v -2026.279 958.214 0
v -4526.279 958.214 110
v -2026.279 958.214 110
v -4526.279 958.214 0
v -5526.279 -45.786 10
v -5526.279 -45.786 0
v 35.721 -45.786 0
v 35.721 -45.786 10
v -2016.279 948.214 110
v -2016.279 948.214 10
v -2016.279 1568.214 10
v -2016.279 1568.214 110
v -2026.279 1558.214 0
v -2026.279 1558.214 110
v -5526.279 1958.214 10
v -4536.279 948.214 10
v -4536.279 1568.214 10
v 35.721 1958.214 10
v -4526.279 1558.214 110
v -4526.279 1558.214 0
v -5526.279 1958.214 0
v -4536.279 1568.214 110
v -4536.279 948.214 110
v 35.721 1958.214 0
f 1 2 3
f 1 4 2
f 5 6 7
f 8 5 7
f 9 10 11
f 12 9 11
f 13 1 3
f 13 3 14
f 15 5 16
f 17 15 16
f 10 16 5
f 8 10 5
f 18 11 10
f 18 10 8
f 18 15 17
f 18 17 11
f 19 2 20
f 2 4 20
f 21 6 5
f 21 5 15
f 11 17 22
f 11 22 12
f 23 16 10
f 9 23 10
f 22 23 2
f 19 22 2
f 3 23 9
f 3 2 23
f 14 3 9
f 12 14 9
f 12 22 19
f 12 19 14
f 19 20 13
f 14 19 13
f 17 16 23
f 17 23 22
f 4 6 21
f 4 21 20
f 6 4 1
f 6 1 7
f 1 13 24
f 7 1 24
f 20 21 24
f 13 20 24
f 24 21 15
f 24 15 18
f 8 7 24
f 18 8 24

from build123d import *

# Parameters (mm, degrees)
F0_W     = 5562
F0_H     = 2004
F1_DEPTH = 10
F2_W     = 2500
F2_H     = 600
F3_DEPTH = 25
F4_W     = 2520
F4_H     = 620
F4_W_2   = 2500
F4_H_2   = 600
F5_DEPTH = 100


with BuildPart() as f1:
    # F0 (on Top) → F1 (new body)
    with BuildSketch(Plane.XY):
        with Locations((-2745.279001, 956.213645)):
            Rectangle(F0_W, F0_H)
    extrude(amount=F1_DEPTH)

    # F2 (on face) → F3 (cut)
    with BuildSketch(Plane.XY.offset(10)):
        with Locations((-3276.279001, 1258.213645)):
            Rectangle(F2_W, F2_H)
    extrude(amount=-F3_DEPTH, mode=Mode.SUBTRACT)

    # F4 (on face) → F5 (join)
    with BuildSketch(Plane.XY.offset(10)):
        with Locations((-3276.279001, 1258.213645)):
            Rectangle(F4_W, F4_H)
        with Locations((-3276.279001, 1258.213645)):
            Rectangle(F4_W_2, F4_H_2, mode=Mode.SUBTRACT)
    extrude(amount=F5_DEPTH)


solid = f1.part
